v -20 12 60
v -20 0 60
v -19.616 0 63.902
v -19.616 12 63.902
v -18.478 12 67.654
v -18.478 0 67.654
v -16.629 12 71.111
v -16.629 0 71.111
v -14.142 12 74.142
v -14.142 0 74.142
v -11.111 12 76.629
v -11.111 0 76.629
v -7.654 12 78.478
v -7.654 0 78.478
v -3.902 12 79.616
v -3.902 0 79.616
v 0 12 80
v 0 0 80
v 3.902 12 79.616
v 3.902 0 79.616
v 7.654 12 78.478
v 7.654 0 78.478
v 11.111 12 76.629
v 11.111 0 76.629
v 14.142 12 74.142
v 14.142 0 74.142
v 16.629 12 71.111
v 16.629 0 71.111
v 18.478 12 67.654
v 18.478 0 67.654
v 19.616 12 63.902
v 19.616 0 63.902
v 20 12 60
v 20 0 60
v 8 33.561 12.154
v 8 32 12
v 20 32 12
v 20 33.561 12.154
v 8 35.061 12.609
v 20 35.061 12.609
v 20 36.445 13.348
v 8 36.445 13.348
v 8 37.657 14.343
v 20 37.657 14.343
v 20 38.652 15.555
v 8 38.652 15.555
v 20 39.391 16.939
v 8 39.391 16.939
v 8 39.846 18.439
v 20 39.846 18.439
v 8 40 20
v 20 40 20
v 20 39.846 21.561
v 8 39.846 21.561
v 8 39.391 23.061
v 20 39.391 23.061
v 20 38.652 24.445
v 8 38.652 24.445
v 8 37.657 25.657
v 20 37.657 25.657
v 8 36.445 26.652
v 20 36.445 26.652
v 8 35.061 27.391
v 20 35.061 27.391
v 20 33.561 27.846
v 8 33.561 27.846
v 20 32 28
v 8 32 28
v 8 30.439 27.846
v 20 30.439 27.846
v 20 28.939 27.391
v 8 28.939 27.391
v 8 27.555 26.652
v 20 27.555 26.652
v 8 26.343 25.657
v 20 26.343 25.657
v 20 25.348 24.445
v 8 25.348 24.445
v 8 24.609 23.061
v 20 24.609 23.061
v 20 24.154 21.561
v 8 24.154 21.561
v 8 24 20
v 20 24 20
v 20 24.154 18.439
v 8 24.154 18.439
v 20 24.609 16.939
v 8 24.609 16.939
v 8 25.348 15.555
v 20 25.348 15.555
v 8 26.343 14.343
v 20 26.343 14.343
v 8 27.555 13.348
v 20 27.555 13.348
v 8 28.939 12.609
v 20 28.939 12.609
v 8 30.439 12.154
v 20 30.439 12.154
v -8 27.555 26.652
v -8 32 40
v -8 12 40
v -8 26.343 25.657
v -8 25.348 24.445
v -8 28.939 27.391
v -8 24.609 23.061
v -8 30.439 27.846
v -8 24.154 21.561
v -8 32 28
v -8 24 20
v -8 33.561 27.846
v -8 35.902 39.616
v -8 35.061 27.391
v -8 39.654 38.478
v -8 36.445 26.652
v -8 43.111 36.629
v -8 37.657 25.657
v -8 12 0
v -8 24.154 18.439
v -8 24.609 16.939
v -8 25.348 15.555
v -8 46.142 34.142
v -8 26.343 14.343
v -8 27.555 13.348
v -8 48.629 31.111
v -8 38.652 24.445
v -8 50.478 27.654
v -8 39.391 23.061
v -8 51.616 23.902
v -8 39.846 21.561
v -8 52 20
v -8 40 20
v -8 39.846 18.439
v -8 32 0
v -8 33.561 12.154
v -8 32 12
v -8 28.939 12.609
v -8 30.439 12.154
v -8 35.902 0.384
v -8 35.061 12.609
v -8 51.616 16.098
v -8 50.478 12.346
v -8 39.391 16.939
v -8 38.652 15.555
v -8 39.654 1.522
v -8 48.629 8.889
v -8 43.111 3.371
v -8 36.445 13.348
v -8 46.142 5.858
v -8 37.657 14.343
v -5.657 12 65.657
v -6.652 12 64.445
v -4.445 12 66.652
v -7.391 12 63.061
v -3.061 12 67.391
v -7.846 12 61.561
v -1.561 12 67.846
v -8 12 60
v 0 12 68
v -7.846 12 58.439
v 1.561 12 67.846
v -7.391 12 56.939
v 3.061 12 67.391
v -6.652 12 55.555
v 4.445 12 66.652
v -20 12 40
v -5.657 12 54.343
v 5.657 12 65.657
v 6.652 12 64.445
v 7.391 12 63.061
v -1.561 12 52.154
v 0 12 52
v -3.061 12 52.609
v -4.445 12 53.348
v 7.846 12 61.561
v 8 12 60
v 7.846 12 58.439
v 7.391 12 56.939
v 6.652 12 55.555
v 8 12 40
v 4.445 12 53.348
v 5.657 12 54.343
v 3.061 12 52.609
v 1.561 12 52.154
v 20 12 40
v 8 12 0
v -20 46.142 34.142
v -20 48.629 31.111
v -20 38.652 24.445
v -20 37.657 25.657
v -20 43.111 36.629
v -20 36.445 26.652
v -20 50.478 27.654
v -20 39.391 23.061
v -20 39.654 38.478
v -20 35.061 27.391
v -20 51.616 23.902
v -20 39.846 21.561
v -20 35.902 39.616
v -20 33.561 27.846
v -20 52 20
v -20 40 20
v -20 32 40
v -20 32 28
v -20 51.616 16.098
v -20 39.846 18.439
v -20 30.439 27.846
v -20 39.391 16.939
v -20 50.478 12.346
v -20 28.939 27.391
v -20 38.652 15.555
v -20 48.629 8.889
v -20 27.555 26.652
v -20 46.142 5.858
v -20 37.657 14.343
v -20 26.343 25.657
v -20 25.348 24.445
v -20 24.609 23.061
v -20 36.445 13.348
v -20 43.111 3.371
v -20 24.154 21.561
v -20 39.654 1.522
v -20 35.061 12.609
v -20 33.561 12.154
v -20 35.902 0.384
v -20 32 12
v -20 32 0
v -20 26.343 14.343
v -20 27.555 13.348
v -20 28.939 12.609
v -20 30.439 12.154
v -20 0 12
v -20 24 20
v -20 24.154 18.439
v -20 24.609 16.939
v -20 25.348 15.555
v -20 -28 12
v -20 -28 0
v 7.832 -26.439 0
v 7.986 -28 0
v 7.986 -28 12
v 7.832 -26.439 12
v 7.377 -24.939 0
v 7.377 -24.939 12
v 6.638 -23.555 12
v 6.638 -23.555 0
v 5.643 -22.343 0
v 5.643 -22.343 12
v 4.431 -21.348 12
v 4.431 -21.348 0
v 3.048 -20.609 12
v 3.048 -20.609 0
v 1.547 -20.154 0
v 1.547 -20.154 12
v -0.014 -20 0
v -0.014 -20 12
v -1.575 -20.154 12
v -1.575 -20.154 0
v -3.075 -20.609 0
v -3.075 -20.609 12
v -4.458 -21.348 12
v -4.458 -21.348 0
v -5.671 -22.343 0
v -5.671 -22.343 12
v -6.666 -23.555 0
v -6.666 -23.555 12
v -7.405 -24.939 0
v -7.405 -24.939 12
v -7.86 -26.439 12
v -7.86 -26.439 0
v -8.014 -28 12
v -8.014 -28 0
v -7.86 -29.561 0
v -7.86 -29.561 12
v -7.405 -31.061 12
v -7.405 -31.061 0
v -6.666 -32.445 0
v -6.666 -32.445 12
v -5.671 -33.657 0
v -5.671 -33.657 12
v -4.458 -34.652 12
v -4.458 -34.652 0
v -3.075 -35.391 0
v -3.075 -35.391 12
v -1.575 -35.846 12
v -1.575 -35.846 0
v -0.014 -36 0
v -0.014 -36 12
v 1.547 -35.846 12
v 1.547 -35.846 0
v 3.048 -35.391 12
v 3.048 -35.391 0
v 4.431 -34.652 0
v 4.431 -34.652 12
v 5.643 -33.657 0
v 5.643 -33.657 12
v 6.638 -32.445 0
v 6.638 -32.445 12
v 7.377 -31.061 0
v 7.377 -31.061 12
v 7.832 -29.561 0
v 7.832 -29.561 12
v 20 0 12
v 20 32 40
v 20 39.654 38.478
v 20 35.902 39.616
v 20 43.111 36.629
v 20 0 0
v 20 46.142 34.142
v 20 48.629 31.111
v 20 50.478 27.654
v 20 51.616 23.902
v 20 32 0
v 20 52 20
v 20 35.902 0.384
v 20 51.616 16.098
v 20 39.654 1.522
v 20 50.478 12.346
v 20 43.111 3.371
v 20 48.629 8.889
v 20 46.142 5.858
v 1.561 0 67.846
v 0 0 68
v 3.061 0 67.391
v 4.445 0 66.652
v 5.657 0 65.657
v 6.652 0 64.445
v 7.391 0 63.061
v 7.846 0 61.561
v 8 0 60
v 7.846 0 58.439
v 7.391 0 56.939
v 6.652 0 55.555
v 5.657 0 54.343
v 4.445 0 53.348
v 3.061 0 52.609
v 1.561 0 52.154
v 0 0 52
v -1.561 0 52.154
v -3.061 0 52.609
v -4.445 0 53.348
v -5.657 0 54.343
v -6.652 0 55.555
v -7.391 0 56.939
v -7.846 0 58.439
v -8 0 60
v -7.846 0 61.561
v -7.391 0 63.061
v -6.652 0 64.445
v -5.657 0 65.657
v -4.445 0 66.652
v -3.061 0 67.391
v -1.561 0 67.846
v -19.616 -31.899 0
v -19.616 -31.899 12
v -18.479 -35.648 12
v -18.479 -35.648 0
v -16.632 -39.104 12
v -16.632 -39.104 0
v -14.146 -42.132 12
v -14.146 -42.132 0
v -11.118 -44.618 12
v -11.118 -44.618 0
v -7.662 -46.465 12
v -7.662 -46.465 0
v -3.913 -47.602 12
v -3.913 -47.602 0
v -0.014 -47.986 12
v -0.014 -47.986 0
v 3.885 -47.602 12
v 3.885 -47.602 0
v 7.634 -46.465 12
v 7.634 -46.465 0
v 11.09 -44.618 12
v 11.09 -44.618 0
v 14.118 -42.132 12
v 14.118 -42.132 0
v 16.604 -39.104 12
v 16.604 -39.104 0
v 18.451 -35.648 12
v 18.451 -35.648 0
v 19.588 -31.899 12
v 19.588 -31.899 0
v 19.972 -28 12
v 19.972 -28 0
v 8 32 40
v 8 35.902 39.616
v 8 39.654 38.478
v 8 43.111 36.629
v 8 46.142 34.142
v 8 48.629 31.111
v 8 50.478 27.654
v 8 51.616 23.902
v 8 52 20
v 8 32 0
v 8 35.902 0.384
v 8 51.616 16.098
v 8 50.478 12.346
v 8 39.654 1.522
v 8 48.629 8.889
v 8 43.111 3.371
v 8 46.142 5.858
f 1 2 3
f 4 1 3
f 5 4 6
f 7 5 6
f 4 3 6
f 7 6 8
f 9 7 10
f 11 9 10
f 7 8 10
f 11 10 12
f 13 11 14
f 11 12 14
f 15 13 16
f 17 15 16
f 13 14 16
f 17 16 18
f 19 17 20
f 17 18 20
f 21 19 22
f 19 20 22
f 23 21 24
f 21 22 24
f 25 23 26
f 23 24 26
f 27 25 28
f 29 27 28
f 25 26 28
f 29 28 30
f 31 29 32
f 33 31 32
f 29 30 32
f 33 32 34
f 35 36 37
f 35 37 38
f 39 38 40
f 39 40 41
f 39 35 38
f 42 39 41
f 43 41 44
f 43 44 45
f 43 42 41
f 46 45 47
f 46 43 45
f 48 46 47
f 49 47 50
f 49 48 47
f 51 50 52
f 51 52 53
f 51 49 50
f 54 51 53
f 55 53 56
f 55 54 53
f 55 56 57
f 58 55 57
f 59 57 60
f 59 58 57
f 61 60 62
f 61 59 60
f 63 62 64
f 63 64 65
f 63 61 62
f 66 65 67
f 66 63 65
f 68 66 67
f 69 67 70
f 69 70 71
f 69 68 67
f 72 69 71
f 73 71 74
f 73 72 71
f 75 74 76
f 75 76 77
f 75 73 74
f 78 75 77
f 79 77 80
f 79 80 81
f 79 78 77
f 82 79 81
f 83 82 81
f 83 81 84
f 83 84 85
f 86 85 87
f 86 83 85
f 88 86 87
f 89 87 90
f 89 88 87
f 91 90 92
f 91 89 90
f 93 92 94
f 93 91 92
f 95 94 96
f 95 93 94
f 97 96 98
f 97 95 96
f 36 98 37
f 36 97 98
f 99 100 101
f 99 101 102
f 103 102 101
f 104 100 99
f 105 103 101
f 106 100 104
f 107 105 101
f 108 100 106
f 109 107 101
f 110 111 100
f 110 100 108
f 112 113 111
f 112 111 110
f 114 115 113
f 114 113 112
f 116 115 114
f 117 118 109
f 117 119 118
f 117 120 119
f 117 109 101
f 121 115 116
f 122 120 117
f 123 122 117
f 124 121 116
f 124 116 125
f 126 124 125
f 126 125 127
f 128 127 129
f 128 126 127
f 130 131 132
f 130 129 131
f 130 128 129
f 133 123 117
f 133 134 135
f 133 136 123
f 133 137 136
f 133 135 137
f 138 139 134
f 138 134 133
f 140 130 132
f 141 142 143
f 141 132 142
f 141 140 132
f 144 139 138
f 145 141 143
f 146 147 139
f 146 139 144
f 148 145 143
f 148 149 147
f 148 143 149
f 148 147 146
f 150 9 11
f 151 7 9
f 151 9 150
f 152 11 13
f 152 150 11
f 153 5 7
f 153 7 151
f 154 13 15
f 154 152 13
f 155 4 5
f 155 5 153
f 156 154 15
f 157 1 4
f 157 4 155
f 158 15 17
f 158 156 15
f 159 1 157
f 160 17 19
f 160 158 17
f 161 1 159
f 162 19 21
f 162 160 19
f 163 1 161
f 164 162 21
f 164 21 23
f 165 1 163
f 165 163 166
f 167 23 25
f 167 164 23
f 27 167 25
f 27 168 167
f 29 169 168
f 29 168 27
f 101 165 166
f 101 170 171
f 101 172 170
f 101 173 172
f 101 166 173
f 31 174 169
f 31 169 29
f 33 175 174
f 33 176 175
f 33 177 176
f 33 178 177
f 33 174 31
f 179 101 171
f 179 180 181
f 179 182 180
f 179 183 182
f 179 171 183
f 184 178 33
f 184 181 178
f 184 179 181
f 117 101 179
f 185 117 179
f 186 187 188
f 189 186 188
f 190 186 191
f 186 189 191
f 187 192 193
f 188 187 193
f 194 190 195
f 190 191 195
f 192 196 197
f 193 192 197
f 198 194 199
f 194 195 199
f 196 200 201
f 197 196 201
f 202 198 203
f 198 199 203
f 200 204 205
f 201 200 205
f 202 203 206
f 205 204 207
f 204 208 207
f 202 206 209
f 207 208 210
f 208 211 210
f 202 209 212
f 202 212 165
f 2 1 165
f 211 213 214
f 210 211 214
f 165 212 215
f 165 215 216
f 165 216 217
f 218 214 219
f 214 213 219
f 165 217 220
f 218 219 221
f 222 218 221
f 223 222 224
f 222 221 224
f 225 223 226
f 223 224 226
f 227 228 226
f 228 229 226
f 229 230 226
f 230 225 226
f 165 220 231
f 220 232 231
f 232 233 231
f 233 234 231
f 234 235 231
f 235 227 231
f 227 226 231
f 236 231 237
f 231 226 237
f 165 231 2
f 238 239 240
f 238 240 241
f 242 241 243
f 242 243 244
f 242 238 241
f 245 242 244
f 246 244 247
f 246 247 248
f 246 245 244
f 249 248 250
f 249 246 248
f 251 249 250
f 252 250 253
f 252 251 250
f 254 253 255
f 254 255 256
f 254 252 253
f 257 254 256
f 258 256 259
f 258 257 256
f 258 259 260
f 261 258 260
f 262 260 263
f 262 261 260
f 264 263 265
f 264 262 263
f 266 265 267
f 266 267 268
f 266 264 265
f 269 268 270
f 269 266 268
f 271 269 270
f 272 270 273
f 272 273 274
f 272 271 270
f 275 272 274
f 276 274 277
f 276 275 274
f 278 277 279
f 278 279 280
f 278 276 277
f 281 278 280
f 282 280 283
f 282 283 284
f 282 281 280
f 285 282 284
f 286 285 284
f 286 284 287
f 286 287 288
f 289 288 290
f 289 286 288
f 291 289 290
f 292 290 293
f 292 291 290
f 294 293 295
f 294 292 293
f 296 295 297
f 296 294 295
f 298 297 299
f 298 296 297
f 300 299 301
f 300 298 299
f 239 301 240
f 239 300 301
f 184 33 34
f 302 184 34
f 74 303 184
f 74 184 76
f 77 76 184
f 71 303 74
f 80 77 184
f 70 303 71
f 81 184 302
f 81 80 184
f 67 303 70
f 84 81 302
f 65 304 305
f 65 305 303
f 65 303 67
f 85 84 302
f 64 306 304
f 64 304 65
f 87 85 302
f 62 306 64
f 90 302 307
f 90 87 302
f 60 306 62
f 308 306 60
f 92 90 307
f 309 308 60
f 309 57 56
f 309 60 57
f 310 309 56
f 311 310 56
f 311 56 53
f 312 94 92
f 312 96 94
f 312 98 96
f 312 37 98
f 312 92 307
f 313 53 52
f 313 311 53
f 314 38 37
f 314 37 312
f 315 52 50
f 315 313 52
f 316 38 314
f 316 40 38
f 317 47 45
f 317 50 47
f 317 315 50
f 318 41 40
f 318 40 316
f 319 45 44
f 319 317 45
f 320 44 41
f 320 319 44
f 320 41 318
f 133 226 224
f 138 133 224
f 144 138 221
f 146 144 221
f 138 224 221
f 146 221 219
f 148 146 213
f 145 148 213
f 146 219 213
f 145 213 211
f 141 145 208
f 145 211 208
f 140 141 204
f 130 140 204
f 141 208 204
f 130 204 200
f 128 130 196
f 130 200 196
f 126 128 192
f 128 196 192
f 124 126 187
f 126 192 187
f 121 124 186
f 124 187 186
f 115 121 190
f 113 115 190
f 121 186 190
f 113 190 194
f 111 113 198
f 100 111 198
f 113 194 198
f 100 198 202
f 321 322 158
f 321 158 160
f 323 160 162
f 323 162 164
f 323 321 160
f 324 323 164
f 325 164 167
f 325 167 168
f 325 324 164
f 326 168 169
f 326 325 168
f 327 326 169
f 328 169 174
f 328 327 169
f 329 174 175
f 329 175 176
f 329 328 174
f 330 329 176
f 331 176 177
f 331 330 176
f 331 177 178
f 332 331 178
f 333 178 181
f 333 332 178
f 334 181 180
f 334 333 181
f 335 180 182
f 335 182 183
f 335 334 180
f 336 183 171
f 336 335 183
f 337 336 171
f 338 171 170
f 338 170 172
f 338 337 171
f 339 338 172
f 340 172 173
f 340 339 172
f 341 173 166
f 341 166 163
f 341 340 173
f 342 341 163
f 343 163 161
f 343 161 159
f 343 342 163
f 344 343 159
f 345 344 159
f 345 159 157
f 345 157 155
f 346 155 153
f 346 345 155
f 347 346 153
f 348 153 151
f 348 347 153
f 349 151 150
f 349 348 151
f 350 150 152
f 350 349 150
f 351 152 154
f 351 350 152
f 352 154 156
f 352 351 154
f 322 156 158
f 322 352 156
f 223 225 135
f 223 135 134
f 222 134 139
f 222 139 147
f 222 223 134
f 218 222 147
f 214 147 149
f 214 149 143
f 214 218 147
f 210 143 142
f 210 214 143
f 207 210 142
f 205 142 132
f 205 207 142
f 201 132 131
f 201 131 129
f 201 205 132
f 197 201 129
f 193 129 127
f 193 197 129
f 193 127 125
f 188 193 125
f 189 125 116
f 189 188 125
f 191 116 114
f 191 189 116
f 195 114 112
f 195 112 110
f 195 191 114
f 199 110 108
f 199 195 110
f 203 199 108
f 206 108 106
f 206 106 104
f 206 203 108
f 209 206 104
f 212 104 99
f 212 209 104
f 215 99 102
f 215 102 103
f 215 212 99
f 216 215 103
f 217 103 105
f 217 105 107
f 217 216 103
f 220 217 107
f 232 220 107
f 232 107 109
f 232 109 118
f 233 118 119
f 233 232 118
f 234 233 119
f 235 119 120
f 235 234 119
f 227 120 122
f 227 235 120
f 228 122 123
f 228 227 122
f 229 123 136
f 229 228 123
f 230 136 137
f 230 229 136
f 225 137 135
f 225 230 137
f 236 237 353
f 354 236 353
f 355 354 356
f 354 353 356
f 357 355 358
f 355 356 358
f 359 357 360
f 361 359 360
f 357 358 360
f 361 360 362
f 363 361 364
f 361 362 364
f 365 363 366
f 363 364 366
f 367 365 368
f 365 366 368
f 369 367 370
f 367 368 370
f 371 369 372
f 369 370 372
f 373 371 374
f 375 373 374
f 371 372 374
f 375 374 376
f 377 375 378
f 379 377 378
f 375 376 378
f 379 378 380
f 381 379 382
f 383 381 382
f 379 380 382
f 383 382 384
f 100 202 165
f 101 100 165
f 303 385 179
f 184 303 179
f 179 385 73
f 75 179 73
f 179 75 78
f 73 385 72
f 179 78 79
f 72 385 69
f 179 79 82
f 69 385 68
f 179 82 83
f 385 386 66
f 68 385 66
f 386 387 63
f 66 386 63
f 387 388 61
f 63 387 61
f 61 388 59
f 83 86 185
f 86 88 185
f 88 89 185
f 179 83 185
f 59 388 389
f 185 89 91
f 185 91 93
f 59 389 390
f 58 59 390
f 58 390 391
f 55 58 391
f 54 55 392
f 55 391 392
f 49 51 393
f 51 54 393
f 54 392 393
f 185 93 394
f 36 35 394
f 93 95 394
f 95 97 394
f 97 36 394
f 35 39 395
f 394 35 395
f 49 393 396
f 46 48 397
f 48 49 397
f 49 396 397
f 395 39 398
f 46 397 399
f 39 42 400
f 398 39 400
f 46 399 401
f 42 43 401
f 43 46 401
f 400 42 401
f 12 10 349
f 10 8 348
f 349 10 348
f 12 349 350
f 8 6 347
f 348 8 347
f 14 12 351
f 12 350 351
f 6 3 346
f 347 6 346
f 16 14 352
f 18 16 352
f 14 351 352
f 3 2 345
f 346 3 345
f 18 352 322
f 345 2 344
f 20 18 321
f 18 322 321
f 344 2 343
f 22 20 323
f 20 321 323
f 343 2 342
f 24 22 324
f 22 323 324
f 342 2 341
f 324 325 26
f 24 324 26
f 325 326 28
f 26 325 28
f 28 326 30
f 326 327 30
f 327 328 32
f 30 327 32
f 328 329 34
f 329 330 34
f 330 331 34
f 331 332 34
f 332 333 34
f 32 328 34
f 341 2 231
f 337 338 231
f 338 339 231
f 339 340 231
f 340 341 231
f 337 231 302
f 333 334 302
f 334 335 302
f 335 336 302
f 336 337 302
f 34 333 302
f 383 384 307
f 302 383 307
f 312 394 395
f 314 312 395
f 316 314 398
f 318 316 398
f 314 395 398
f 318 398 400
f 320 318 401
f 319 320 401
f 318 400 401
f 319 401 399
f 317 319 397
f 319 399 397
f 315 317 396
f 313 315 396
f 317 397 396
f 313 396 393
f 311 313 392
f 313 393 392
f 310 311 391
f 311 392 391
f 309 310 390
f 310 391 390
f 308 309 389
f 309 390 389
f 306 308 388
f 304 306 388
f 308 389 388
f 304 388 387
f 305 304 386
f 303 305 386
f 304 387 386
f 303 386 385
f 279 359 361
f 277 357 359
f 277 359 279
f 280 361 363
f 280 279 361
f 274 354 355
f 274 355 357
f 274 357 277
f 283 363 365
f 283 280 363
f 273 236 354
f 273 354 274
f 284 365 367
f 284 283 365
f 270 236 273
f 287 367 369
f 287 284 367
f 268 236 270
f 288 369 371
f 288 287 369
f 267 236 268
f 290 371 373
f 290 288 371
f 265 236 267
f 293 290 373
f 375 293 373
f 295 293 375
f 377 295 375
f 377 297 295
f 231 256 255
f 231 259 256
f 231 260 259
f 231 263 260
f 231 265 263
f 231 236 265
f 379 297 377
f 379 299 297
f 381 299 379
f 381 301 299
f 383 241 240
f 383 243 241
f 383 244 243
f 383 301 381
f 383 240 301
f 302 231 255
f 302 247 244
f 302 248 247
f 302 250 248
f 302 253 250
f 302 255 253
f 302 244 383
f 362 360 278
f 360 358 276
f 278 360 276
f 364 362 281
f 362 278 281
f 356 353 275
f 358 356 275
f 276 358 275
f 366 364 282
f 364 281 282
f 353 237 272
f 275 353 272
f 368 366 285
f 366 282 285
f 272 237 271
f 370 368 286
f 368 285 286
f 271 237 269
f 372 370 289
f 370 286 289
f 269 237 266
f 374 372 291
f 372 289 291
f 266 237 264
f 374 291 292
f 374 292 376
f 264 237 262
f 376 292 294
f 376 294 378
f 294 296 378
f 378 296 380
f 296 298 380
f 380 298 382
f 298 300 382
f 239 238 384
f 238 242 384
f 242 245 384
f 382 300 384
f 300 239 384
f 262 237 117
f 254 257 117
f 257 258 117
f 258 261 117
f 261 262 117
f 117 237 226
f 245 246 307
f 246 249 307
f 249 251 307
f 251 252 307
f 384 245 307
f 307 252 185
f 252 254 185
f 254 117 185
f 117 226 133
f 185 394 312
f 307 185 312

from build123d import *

# Parameters (mm, degrees)
SKETCH1_R           = 8
BOSS_EXTRUDE1_DEPTH = 12
BOSS_EXTRUDE2_START = 8
SKETCH2_R           = 8
BOSS_EXTRUDE2_DEPTH = 12
BOSS_EXTRUDE3_START = -20
SKETCH2_3_R         = 8
BOSS_EXTRUDE3_DEPTH = 12
SKETCH3_R           = 8
BOSS_EXTRUDE4_DEPTH = 12


with BuildPart() as part:
    # Sketch1 → Boss-Extrude1 (new body)
    with BuildSketch(Plane(origin=(0, 0, 0), x_dir=(1, 0, 0), z_dir=(0, 1, 0))):
        with BuildLine():
            Line((20, -60), (20, 0))
            Line((20, 0), (-20, 0))
            Line((-20, 0), (-20, -60))
            ThreePointArc((-20, -60), (0, -80), (20, -60))
        make_face()
        with Locations((0, -60)):
            Circle(SKETCH1_R, mode=Mode.SUBTRACT)
    extrude(amount=BOSS_EXTRUDE1_DEPTH)

    # Sketch2 → Boss-Extrude2 (add)
    with BuildSketch(Plane(origin=(0, 0, 0), x_dir=(0, 0, -1), z_dir=(1, 0, 0)).offset(BOSS_EXTRUDE2_START)):
        with BuildLine():
            Line((-40, 12), (0, 12))
            Line((0, 12), (0, 32))
            ThreePointArc((0, 32), (-20, 52), (-40, 32))
            Line((-40, 32), (-40, 12))
        make_face()
        with Locations((-20, 32)):
            Circle(SKETCH2_R, mode=Mode.SUBTRACT)
    extrude(amount=BOSS_EXTRUDE2_DEPTH)

    # Sketch2<3> → Boss-Extrude3 (add)
    with BuildSketch(Plane(origin=(0, 0, 0), x_dir=(0, 0, -1), z_dir=(1, 0, 0)).offset(BOSS_EXTRUDE3_START)):
        with BuildLine():
            Line((-40, 12), (0, 12))
            Line((0, 12), (0, 32))
            ThreePointArc((0, 32), (-20, 52), (-40, 32))
            Line((-40, 32), (-40, 12))
        make_face()
        with Locations((-20, 32)):
            Circle(SKETCH2_3_R, mode=Mode.SUBTRACT)
    extrude(amount=BOSS_EXTRUDE3_DEPTH)

    # Sketch3 → Boss-Extrude4 (add)
    with BuildSketch(Plane.XY):
        with BuildLine():
            Line((20, 0), (-20, 0))
            Line((-20, 0), (-20, -28))
            ThreePointArc((-20, -28), (-0.013931924, -47.986068076), (19.972136151, -28))
            Line((19.972136151, -28), (20, 0))
        make_face()
        with Locations((-0.013931924, -28)):
            Circle(SKETCH3_R, mode=Mode.SUBTRACT)
    extrude(amount=BOSS_EXTRUDE4_DEPTH)


solid = part.part
